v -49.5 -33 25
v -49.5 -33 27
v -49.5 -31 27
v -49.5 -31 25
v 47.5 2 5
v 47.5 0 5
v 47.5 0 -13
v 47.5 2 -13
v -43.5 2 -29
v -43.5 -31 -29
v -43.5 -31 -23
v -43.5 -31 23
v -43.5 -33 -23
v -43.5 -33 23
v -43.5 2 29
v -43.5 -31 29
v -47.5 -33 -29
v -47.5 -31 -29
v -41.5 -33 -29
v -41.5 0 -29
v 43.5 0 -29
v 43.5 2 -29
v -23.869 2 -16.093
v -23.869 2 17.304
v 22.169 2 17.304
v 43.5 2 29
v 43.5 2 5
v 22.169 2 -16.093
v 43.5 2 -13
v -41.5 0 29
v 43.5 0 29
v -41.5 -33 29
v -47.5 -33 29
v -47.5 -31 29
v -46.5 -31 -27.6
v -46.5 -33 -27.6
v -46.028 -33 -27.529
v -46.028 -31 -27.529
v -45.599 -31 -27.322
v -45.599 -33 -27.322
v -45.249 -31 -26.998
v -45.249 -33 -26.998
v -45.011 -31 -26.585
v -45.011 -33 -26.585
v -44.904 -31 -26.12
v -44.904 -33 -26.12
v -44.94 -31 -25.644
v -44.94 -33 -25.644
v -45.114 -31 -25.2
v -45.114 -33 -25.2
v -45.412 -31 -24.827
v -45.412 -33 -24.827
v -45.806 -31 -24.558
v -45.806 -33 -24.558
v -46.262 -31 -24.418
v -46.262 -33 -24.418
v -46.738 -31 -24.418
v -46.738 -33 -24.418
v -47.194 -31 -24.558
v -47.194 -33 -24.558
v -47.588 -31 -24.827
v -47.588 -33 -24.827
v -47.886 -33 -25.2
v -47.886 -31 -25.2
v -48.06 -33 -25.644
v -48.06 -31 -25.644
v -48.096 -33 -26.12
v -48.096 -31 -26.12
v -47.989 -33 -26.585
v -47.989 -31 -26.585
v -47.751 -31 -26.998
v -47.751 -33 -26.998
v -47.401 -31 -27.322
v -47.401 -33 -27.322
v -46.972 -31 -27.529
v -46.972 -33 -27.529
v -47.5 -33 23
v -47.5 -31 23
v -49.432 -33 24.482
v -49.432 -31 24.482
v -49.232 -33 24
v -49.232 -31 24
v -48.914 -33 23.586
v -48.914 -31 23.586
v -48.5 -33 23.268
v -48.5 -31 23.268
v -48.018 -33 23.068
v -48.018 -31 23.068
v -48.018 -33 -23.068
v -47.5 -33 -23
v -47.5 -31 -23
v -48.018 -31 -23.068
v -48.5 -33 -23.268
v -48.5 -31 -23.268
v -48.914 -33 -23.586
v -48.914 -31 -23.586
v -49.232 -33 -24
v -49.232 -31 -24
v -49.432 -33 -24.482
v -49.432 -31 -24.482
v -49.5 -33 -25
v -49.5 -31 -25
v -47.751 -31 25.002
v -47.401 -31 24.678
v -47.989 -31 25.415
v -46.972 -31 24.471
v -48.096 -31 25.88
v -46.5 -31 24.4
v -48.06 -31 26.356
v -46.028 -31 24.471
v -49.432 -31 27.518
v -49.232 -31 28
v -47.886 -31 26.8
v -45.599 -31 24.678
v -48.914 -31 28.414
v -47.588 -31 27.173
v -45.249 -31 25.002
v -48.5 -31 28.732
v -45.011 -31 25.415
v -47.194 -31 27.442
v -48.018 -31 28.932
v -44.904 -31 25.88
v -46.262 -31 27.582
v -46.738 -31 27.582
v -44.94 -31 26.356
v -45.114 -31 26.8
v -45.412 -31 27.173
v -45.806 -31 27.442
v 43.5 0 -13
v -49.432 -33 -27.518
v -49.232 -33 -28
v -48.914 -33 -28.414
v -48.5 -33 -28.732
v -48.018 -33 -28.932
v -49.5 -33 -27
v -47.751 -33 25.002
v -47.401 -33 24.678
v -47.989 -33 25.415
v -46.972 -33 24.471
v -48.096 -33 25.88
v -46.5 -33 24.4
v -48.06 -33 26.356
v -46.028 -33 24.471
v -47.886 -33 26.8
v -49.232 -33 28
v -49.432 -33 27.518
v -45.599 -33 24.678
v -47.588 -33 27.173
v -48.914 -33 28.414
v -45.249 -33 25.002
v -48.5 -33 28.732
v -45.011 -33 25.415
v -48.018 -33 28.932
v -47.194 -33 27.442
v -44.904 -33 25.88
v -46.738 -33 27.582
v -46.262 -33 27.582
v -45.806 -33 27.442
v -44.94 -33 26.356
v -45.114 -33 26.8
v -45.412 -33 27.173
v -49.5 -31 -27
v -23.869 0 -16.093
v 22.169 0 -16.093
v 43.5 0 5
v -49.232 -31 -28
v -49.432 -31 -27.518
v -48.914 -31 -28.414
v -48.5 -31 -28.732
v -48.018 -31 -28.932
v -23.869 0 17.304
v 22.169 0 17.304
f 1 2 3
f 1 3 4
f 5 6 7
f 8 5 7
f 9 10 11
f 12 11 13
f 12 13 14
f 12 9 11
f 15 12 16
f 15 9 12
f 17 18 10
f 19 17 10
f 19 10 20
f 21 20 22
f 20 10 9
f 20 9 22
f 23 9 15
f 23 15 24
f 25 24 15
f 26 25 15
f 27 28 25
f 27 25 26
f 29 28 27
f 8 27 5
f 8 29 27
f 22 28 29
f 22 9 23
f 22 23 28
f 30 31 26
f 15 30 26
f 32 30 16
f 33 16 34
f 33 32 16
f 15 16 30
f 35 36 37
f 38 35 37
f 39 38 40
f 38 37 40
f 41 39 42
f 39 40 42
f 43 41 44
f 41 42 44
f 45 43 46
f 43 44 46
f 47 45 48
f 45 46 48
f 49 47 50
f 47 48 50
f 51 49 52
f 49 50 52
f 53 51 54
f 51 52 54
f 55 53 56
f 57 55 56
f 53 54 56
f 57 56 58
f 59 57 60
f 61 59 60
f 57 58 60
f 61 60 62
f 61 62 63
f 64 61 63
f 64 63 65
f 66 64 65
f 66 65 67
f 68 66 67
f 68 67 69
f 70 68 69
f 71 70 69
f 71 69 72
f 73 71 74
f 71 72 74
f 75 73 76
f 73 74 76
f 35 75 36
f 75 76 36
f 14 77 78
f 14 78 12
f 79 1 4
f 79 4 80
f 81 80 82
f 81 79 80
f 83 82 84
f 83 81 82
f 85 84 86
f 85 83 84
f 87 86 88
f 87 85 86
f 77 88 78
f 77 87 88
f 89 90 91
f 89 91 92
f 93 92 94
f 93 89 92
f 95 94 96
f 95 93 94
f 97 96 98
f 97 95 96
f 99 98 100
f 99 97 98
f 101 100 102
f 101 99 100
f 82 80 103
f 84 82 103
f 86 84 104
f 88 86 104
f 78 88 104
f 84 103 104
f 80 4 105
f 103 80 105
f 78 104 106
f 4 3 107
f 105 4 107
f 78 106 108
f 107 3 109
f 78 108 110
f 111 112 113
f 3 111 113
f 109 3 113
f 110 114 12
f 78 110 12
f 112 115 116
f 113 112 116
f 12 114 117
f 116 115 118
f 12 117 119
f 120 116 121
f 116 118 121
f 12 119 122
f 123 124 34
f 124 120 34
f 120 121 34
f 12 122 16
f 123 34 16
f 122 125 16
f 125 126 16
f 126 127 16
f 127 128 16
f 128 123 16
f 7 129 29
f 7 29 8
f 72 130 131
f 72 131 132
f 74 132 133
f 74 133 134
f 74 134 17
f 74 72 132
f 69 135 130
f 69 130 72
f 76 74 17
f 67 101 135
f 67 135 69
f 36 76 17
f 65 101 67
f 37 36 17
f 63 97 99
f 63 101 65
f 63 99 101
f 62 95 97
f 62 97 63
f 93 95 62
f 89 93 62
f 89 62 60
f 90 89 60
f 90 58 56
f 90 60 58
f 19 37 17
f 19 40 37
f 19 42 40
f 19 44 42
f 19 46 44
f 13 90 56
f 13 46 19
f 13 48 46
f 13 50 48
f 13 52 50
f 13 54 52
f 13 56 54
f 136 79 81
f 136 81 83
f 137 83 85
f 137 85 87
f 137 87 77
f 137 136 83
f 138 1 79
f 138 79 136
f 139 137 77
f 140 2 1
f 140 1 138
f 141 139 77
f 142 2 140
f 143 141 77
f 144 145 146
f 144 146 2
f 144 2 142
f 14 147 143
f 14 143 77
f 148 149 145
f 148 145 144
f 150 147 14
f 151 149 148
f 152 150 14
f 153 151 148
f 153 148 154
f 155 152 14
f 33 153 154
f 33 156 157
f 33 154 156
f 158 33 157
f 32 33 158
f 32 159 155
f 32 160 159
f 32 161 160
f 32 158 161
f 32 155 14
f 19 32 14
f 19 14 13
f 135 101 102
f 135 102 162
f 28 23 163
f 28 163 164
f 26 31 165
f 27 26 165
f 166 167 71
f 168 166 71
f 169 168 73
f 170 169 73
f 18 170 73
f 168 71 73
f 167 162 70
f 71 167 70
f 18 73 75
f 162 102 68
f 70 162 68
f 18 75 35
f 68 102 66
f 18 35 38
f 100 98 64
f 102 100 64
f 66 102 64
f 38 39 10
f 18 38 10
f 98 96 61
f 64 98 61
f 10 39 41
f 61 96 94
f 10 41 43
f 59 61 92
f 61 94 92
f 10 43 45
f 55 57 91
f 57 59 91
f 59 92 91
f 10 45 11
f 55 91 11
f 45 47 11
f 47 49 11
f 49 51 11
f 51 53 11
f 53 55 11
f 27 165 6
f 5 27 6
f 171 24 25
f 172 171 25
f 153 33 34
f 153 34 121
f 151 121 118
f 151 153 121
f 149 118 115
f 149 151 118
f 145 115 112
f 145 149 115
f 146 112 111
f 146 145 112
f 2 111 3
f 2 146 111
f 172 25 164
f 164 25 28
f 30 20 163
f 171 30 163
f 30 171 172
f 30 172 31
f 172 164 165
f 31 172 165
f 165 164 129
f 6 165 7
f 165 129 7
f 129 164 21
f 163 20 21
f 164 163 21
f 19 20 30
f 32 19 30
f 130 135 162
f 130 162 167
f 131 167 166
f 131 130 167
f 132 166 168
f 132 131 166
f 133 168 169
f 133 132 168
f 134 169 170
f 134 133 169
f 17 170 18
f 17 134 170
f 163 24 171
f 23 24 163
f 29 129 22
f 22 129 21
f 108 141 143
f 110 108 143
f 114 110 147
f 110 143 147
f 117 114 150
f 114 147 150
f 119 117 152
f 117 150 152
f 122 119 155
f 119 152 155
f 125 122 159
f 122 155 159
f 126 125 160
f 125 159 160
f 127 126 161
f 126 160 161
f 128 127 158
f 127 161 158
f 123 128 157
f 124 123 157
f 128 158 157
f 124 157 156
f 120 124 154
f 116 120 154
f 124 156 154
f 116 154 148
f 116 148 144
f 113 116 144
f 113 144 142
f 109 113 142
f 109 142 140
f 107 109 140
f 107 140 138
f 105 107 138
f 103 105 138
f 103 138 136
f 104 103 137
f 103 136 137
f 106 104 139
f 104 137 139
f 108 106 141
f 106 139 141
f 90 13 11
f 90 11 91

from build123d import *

# Parameters (mm, degrees)
SKETCH_1_W          = 87
SKETCH_1_H          = 58
SKETCH_1_W_2        = 4
SKETCH_1_H_2        = 18
EXTRUDE_1_DEPTH     = 2
SKETCH_2_W          = 2
SKETCH_2_H          = 58
EXTRUDE_2_DEPTH     = 33
SKETCH_3_R          = 1.6
EXTRUDE_3_DEPTH     = 2
CUT_EXTRUDE_1_REACH = 69.203
SKETCH_4_W          = 46.038149354
SKETCH_4_H          = 33.396976304


with BuildPart() as part:
    # 草图1 → 凸台-拉伸1 (new body)
    with BuildSketch(Plane(origin=(0, 0, 0), x_dir=(1, 0, 0), z_dir=(0, 1, 0))):
        Rectangle(SKETCH_1_W, SKETCH_1_H)
        with Locations((45.5, 4)):
            Rectangle(SKETCH_1_W_2, SKETCH_1_H_2)
    extrude(amount=EXTRUDE_1_DEPTH)

    # 草图2 → 凸台-拉伸2 (add)
    with BuildSketch(Plane.XZ):
        with Locations((-42.5, 0)):
            Rectangle(SKETCH_2_W, SKETCH_2_H)
    extrude(amount=EXTRUDE_2_DEPTH)

    # 草图3 → 凸台-拉伸3 (add)
    # profile 1 of 3: a face of its own
    with BuildSketch(Plane.XZ.offset(33)):
        with BuildLine():
            Line((-43.5, 23), (-43.5, 29))
            Line((-43.5, 29), (-47.5, 29))
            ThreePointArc((-47.5, 29), (-48.914213562, 28.414213562), (-49.5, 27))
            Line((-49.5, 27), (-49.5, 25))
            ThreePointArc((-49.5, 25), (-48.914213562, 23.585786438), (-47.5, 23))
            Line((-47.5, 23), (-43.5, 23))
        make_face()
        with Locations(Location((-46.5, 26, 0), (0, 0, 270))):
            Circle(SKETCH_3_R, mode=Mode.SUBTRACT)
    # profile 2 of 3: a face of its own
    with BuildSketch(Plane.XZ.offset(33)):
        Polygon((-41.5, 29), (-43.5, 29), (-43.5, 23), (-43.5, -23), (-43.5, -29), (-41.5, -29), align=None)
    # profile 3 of 3: a face of its own
    with BuildSketch(Plane.XZ.offset(33)):
        with BuildLine():
            Line((-43.5, -29), (-43.5, -23))
            Line((-43.5, -23), (-47.5, -23))
            ThreePointArc((-47.5, -23), (-48.914213562, -23.585786438), (-49.5, -25))
            Line((-49.5, -25), (-49.5, -27))
            ThreePointArc((-49.5, -27), (-48.914213562, -28.414213562), (-47.5, -29))
            Line((-47.5, -29), (-43.5, -29))
        make_face()
        with Locations(Location((-46.5, -26, 0), (0, 0, 270))):
            Circle(SKETCH_3_R, mode=Mode.SUBTRACT)
    extrude(amount=-EXTRUDE_3_DEPTH)

    # 草图4 → 切除-拉伸1 (cut, up to next)
    with BuildSketch(Plane(origin=(0, 2, 0), x_dir=(1, 0, 0), z_dir=(0, 1, 0)), mode=Mode.PRIVATE) as cut_extrude_1_sk1:
        with Locations((-0.850083312, -0.605075521)):
            Rectangle(SKETCH_4_W, SKETCH_4_H)
    cut_extrude_1_tool1 = extrude(cut_extrude_1_sk1.sketch, amount=-CUT_EXTRUDE_1_REACH, mode=Mode.PRIVATE) & part.part
    add(cut_extrude_1_tool1.solids().sort_by_distance((-0.850083, 2, 0.605076))[0], mode=Mode.SUBTRACT)


solid = part.part
